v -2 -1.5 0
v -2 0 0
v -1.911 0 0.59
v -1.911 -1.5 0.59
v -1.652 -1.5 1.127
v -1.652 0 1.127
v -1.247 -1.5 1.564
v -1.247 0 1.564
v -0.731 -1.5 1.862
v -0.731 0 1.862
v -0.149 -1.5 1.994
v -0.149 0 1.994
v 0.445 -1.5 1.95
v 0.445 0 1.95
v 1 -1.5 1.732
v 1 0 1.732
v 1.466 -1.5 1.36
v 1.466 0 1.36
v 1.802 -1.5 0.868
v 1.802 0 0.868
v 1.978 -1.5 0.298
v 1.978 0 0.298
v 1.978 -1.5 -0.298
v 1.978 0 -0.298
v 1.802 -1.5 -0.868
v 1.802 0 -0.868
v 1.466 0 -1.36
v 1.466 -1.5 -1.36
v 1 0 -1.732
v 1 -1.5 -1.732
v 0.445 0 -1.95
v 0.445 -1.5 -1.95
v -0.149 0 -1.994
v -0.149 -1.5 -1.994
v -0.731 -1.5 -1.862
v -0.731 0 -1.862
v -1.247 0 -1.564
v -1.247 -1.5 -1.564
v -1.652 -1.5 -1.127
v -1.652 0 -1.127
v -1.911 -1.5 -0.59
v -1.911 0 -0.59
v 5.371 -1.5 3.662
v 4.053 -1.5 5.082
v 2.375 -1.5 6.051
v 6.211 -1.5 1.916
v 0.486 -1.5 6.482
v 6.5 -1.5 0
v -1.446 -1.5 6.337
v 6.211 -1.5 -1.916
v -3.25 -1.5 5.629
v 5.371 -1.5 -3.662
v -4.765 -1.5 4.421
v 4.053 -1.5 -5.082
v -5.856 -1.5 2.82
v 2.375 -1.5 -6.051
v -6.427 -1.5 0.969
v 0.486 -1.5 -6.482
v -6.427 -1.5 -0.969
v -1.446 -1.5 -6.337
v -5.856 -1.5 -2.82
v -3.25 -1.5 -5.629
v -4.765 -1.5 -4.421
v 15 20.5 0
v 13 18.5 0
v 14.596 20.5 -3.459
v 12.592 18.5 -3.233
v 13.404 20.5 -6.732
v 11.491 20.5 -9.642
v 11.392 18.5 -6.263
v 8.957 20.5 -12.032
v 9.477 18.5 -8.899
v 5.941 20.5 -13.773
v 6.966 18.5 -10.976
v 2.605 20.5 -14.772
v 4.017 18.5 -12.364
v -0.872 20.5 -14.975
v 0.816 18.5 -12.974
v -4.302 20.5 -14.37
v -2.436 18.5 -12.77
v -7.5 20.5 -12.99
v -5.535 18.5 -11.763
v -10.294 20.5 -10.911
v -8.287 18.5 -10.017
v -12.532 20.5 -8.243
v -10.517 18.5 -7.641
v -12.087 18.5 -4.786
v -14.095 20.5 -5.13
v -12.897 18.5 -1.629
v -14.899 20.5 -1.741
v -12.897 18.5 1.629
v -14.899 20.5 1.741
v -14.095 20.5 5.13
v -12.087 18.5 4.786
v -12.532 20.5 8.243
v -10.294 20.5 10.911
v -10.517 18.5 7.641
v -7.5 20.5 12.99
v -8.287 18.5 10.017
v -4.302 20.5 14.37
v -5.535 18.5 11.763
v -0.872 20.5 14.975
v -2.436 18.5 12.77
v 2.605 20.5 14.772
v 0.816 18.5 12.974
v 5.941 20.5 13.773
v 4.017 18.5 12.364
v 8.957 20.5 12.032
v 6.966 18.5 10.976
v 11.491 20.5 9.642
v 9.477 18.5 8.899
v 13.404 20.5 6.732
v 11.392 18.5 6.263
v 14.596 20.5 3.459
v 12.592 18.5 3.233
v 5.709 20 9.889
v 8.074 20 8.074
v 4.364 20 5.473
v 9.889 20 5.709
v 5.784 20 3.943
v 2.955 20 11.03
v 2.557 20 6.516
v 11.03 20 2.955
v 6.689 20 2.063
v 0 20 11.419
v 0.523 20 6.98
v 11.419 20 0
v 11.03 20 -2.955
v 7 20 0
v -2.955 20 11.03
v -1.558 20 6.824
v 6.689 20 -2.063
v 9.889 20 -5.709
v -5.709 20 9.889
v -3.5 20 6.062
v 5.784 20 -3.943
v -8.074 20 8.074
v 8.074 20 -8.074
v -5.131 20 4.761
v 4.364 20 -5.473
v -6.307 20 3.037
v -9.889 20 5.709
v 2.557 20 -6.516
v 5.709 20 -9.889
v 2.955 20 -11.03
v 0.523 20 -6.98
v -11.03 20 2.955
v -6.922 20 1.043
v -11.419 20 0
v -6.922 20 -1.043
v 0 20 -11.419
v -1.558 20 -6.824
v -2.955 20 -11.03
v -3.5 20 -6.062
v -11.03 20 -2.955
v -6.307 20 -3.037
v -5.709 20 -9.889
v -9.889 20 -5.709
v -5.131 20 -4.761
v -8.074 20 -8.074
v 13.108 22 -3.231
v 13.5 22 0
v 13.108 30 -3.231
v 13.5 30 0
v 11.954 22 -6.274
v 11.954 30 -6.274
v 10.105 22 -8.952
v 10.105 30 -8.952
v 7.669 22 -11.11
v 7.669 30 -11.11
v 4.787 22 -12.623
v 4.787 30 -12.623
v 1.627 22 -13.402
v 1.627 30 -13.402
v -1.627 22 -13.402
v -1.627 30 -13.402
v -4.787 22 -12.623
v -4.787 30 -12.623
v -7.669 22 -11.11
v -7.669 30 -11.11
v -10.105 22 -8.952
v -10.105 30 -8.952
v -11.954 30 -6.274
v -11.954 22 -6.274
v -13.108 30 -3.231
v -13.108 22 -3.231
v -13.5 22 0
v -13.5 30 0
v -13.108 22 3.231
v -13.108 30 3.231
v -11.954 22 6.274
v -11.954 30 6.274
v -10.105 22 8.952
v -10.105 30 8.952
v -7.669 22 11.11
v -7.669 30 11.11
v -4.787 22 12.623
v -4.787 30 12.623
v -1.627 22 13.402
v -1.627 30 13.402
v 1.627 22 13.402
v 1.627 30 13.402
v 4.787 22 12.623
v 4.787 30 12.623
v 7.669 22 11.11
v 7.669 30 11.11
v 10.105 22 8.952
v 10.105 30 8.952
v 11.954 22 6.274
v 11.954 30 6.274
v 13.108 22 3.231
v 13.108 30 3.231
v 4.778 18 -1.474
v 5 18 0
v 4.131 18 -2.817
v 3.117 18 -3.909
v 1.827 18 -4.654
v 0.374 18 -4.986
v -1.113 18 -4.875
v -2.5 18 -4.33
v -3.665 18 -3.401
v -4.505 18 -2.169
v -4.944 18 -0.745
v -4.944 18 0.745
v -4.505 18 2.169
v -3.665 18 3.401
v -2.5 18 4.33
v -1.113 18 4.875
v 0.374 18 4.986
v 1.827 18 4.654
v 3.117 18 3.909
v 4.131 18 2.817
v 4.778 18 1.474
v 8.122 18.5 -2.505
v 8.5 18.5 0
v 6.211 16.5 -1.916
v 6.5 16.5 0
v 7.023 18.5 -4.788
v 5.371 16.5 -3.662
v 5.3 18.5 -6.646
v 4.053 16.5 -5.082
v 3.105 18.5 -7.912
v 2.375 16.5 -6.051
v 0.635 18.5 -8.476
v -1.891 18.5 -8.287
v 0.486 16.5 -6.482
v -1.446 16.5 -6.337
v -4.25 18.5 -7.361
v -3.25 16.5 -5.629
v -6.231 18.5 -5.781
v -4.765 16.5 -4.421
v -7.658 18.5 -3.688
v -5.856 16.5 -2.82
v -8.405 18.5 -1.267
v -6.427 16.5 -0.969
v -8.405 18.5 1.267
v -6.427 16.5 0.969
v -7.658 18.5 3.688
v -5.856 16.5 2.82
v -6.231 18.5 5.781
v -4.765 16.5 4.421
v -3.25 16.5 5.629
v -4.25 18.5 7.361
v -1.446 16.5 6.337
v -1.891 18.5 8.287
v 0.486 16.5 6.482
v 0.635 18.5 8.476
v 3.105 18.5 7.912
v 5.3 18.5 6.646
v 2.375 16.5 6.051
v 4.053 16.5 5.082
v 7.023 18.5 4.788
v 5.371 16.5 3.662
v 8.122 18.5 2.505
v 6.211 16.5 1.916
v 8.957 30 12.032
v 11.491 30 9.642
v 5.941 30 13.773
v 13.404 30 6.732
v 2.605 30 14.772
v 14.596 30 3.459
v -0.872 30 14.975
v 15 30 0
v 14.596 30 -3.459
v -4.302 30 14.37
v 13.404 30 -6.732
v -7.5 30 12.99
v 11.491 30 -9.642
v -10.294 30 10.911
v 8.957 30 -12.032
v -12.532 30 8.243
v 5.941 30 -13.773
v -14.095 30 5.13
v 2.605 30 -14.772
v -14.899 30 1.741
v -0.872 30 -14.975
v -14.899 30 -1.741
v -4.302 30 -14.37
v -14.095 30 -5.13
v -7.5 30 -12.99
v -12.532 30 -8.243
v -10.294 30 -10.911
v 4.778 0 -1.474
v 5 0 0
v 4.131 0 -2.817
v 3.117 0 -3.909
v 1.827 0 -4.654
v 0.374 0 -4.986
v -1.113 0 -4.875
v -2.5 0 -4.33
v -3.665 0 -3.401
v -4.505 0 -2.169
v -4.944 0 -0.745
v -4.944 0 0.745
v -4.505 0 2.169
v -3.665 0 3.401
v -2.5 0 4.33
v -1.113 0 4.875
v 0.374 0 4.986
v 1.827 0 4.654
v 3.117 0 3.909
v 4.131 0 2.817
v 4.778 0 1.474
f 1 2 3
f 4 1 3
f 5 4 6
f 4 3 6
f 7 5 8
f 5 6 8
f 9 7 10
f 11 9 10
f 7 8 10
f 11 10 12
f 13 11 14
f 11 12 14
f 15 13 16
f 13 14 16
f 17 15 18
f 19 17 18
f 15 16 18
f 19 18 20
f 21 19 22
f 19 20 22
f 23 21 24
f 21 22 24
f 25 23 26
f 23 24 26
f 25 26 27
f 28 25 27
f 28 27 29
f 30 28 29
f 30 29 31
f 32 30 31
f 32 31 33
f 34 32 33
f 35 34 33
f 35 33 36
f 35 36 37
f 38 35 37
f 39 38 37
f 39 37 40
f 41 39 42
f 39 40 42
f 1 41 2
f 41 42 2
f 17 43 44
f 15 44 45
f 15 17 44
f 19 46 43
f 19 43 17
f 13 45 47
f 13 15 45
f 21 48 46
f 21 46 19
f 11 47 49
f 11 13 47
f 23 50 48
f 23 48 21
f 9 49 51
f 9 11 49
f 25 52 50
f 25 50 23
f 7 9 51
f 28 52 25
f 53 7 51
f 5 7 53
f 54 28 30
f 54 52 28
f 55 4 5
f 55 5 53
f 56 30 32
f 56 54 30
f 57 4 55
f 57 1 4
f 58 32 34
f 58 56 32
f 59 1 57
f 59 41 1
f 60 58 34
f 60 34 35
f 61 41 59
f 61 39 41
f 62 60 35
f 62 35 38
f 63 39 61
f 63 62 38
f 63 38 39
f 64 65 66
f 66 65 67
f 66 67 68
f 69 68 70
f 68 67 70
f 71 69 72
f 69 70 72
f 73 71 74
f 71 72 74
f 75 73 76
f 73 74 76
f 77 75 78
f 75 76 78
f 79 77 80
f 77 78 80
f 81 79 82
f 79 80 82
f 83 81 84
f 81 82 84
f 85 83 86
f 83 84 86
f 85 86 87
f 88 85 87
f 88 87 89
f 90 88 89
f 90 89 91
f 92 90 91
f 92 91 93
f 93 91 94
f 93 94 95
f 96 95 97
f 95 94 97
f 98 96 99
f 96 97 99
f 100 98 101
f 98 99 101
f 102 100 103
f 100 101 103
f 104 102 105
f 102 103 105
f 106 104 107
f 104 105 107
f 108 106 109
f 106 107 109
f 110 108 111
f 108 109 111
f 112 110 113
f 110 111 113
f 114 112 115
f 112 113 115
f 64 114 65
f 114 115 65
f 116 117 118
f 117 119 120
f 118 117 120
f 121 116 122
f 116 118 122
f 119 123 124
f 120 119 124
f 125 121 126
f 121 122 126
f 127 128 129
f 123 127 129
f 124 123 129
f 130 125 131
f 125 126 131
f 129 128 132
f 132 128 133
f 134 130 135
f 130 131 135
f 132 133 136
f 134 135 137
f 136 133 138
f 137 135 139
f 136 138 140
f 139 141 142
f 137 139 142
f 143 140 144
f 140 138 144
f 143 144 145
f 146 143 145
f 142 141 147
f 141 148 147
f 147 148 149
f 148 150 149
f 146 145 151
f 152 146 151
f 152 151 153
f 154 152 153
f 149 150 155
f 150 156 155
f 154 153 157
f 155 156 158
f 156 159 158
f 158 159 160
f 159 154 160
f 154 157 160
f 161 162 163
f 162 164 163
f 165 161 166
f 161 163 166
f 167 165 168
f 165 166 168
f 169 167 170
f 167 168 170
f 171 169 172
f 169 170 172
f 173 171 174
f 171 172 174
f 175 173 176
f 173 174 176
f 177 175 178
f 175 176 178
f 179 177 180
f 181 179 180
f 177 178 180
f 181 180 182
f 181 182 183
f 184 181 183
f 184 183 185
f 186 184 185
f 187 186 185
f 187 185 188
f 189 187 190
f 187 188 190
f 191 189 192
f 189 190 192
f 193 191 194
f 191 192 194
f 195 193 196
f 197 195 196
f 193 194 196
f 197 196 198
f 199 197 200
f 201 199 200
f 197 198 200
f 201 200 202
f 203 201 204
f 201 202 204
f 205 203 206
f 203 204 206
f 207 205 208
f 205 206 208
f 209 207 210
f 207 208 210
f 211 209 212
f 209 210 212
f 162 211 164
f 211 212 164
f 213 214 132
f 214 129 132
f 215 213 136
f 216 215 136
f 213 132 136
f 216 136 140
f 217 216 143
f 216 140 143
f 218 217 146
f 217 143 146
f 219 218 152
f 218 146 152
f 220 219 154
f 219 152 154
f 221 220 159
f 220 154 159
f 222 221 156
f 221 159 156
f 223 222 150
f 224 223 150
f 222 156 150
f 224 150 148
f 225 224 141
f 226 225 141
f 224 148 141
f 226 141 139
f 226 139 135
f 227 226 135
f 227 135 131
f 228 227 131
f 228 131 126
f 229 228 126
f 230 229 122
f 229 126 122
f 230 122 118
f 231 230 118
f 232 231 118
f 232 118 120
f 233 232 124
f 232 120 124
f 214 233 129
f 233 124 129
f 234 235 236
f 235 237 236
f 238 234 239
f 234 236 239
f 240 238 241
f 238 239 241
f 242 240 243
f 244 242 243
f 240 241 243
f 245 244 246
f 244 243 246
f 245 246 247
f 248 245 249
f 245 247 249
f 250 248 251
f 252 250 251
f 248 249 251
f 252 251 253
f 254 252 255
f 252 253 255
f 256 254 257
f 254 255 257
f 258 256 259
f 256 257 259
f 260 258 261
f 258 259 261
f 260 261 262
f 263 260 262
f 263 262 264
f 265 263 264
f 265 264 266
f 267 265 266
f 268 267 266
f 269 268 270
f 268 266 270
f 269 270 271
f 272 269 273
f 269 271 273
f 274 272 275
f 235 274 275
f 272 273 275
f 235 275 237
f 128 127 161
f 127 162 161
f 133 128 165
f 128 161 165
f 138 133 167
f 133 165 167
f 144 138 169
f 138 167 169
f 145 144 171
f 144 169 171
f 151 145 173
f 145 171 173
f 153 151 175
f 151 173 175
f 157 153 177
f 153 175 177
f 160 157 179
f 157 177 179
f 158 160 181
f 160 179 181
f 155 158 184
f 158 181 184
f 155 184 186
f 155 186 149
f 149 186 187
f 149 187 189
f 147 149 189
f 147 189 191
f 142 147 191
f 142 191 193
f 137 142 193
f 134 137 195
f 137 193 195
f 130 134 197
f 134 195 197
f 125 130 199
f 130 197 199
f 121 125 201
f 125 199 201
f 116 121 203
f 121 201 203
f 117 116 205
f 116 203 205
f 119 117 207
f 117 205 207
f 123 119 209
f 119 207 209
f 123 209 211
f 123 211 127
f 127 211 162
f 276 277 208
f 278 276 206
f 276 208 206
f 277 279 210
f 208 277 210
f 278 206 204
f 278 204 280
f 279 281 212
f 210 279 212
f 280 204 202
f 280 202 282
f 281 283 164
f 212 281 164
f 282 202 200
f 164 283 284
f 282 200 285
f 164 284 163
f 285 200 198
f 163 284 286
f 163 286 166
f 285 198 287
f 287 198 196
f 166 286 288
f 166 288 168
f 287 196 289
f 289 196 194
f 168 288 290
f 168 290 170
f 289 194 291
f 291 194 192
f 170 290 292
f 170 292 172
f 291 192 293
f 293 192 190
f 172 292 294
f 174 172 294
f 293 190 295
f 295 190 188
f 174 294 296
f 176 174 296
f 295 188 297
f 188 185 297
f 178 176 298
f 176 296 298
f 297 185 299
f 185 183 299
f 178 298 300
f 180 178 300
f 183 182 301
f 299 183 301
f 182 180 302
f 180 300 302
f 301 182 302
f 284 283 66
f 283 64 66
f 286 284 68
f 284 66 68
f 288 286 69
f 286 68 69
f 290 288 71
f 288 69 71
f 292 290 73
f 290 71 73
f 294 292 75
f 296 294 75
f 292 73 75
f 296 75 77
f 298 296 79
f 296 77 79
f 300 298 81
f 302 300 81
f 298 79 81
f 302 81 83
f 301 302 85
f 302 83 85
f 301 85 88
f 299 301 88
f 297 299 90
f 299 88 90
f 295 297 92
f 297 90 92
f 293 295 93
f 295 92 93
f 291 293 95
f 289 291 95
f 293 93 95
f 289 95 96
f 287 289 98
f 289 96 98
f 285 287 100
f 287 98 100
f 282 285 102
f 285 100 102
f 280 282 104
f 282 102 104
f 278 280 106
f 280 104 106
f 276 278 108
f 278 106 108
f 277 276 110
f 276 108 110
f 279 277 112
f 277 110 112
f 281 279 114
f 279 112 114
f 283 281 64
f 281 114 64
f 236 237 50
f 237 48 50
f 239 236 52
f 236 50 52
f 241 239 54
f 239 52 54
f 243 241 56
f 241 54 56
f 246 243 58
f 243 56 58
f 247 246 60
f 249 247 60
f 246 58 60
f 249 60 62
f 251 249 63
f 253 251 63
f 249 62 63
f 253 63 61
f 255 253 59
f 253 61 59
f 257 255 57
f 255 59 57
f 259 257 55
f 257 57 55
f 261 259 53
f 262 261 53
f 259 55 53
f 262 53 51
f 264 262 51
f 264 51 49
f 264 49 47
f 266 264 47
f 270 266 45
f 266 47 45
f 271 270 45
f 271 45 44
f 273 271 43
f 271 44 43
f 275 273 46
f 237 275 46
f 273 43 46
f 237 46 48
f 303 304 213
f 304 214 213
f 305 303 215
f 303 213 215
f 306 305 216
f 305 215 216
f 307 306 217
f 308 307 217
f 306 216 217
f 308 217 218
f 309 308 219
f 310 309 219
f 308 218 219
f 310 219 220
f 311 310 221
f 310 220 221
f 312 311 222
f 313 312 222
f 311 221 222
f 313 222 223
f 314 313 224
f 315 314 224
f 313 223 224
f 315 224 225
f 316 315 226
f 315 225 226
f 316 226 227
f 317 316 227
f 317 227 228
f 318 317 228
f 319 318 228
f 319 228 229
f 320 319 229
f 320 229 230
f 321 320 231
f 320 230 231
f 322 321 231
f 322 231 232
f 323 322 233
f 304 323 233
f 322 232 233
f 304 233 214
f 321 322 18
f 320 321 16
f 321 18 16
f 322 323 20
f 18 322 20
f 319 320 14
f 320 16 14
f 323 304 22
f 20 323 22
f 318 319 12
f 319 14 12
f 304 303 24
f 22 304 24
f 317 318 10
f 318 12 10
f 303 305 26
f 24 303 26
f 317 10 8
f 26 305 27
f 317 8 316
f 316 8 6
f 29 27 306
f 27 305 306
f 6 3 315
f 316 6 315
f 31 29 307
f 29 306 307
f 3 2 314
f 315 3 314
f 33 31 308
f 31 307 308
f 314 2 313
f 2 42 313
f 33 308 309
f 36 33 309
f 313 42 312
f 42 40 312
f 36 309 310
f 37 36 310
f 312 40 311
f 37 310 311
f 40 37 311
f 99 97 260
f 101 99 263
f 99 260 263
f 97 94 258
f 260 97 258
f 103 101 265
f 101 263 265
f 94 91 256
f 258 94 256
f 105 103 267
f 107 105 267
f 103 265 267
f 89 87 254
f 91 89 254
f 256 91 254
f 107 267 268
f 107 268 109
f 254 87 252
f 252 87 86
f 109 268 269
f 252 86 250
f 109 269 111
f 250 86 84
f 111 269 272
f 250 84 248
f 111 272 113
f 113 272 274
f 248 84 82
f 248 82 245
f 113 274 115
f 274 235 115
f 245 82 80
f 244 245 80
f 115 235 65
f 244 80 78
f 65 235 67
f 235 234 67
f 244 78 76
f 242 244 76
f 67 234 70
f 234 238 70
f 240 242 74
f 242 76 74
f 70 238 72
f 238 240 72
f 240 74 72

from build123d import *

# Parameters (mm, degrees)
SKETCH_2_R          = 2
CUT_EXTRUDE_1_DEPTH = 1.5


with BuildPart() as part:
    # 草图1 → 旋转3 (revolve)
    with BuildSketch(Plane.XY):
        Polygon((0, 0), (5, 0), (5, 18), (7, 20), (11.418621451, 20), (13.5, 22), (13.5, 30), (15, 30), (15, 20.5), (13, 18.5), (8.5, 18.5), (6.5, 16.5), (6.5, -1.5), (5, -1.5), (0, -1.5), align=None)
    revolve(axis=Axis((0, -297.326720661, 0), (0, 1, 0)))

    # 草图2 → 切除-拉伸1 (cut)
    with BuildSketch(Plane(origin=(0, 0, 0), x_dir=(1, 0, 0), z_dir=(0, 1, 0))):
        with Locations(Location((0, 0, 0), (0, 0, 180))):
            Circle(SKETCH_2_R)
    extrude(amount=-CUT_EXTRUDE_1_DEPTH, mode=Mode.SUBTRACT)


solid = part.part
